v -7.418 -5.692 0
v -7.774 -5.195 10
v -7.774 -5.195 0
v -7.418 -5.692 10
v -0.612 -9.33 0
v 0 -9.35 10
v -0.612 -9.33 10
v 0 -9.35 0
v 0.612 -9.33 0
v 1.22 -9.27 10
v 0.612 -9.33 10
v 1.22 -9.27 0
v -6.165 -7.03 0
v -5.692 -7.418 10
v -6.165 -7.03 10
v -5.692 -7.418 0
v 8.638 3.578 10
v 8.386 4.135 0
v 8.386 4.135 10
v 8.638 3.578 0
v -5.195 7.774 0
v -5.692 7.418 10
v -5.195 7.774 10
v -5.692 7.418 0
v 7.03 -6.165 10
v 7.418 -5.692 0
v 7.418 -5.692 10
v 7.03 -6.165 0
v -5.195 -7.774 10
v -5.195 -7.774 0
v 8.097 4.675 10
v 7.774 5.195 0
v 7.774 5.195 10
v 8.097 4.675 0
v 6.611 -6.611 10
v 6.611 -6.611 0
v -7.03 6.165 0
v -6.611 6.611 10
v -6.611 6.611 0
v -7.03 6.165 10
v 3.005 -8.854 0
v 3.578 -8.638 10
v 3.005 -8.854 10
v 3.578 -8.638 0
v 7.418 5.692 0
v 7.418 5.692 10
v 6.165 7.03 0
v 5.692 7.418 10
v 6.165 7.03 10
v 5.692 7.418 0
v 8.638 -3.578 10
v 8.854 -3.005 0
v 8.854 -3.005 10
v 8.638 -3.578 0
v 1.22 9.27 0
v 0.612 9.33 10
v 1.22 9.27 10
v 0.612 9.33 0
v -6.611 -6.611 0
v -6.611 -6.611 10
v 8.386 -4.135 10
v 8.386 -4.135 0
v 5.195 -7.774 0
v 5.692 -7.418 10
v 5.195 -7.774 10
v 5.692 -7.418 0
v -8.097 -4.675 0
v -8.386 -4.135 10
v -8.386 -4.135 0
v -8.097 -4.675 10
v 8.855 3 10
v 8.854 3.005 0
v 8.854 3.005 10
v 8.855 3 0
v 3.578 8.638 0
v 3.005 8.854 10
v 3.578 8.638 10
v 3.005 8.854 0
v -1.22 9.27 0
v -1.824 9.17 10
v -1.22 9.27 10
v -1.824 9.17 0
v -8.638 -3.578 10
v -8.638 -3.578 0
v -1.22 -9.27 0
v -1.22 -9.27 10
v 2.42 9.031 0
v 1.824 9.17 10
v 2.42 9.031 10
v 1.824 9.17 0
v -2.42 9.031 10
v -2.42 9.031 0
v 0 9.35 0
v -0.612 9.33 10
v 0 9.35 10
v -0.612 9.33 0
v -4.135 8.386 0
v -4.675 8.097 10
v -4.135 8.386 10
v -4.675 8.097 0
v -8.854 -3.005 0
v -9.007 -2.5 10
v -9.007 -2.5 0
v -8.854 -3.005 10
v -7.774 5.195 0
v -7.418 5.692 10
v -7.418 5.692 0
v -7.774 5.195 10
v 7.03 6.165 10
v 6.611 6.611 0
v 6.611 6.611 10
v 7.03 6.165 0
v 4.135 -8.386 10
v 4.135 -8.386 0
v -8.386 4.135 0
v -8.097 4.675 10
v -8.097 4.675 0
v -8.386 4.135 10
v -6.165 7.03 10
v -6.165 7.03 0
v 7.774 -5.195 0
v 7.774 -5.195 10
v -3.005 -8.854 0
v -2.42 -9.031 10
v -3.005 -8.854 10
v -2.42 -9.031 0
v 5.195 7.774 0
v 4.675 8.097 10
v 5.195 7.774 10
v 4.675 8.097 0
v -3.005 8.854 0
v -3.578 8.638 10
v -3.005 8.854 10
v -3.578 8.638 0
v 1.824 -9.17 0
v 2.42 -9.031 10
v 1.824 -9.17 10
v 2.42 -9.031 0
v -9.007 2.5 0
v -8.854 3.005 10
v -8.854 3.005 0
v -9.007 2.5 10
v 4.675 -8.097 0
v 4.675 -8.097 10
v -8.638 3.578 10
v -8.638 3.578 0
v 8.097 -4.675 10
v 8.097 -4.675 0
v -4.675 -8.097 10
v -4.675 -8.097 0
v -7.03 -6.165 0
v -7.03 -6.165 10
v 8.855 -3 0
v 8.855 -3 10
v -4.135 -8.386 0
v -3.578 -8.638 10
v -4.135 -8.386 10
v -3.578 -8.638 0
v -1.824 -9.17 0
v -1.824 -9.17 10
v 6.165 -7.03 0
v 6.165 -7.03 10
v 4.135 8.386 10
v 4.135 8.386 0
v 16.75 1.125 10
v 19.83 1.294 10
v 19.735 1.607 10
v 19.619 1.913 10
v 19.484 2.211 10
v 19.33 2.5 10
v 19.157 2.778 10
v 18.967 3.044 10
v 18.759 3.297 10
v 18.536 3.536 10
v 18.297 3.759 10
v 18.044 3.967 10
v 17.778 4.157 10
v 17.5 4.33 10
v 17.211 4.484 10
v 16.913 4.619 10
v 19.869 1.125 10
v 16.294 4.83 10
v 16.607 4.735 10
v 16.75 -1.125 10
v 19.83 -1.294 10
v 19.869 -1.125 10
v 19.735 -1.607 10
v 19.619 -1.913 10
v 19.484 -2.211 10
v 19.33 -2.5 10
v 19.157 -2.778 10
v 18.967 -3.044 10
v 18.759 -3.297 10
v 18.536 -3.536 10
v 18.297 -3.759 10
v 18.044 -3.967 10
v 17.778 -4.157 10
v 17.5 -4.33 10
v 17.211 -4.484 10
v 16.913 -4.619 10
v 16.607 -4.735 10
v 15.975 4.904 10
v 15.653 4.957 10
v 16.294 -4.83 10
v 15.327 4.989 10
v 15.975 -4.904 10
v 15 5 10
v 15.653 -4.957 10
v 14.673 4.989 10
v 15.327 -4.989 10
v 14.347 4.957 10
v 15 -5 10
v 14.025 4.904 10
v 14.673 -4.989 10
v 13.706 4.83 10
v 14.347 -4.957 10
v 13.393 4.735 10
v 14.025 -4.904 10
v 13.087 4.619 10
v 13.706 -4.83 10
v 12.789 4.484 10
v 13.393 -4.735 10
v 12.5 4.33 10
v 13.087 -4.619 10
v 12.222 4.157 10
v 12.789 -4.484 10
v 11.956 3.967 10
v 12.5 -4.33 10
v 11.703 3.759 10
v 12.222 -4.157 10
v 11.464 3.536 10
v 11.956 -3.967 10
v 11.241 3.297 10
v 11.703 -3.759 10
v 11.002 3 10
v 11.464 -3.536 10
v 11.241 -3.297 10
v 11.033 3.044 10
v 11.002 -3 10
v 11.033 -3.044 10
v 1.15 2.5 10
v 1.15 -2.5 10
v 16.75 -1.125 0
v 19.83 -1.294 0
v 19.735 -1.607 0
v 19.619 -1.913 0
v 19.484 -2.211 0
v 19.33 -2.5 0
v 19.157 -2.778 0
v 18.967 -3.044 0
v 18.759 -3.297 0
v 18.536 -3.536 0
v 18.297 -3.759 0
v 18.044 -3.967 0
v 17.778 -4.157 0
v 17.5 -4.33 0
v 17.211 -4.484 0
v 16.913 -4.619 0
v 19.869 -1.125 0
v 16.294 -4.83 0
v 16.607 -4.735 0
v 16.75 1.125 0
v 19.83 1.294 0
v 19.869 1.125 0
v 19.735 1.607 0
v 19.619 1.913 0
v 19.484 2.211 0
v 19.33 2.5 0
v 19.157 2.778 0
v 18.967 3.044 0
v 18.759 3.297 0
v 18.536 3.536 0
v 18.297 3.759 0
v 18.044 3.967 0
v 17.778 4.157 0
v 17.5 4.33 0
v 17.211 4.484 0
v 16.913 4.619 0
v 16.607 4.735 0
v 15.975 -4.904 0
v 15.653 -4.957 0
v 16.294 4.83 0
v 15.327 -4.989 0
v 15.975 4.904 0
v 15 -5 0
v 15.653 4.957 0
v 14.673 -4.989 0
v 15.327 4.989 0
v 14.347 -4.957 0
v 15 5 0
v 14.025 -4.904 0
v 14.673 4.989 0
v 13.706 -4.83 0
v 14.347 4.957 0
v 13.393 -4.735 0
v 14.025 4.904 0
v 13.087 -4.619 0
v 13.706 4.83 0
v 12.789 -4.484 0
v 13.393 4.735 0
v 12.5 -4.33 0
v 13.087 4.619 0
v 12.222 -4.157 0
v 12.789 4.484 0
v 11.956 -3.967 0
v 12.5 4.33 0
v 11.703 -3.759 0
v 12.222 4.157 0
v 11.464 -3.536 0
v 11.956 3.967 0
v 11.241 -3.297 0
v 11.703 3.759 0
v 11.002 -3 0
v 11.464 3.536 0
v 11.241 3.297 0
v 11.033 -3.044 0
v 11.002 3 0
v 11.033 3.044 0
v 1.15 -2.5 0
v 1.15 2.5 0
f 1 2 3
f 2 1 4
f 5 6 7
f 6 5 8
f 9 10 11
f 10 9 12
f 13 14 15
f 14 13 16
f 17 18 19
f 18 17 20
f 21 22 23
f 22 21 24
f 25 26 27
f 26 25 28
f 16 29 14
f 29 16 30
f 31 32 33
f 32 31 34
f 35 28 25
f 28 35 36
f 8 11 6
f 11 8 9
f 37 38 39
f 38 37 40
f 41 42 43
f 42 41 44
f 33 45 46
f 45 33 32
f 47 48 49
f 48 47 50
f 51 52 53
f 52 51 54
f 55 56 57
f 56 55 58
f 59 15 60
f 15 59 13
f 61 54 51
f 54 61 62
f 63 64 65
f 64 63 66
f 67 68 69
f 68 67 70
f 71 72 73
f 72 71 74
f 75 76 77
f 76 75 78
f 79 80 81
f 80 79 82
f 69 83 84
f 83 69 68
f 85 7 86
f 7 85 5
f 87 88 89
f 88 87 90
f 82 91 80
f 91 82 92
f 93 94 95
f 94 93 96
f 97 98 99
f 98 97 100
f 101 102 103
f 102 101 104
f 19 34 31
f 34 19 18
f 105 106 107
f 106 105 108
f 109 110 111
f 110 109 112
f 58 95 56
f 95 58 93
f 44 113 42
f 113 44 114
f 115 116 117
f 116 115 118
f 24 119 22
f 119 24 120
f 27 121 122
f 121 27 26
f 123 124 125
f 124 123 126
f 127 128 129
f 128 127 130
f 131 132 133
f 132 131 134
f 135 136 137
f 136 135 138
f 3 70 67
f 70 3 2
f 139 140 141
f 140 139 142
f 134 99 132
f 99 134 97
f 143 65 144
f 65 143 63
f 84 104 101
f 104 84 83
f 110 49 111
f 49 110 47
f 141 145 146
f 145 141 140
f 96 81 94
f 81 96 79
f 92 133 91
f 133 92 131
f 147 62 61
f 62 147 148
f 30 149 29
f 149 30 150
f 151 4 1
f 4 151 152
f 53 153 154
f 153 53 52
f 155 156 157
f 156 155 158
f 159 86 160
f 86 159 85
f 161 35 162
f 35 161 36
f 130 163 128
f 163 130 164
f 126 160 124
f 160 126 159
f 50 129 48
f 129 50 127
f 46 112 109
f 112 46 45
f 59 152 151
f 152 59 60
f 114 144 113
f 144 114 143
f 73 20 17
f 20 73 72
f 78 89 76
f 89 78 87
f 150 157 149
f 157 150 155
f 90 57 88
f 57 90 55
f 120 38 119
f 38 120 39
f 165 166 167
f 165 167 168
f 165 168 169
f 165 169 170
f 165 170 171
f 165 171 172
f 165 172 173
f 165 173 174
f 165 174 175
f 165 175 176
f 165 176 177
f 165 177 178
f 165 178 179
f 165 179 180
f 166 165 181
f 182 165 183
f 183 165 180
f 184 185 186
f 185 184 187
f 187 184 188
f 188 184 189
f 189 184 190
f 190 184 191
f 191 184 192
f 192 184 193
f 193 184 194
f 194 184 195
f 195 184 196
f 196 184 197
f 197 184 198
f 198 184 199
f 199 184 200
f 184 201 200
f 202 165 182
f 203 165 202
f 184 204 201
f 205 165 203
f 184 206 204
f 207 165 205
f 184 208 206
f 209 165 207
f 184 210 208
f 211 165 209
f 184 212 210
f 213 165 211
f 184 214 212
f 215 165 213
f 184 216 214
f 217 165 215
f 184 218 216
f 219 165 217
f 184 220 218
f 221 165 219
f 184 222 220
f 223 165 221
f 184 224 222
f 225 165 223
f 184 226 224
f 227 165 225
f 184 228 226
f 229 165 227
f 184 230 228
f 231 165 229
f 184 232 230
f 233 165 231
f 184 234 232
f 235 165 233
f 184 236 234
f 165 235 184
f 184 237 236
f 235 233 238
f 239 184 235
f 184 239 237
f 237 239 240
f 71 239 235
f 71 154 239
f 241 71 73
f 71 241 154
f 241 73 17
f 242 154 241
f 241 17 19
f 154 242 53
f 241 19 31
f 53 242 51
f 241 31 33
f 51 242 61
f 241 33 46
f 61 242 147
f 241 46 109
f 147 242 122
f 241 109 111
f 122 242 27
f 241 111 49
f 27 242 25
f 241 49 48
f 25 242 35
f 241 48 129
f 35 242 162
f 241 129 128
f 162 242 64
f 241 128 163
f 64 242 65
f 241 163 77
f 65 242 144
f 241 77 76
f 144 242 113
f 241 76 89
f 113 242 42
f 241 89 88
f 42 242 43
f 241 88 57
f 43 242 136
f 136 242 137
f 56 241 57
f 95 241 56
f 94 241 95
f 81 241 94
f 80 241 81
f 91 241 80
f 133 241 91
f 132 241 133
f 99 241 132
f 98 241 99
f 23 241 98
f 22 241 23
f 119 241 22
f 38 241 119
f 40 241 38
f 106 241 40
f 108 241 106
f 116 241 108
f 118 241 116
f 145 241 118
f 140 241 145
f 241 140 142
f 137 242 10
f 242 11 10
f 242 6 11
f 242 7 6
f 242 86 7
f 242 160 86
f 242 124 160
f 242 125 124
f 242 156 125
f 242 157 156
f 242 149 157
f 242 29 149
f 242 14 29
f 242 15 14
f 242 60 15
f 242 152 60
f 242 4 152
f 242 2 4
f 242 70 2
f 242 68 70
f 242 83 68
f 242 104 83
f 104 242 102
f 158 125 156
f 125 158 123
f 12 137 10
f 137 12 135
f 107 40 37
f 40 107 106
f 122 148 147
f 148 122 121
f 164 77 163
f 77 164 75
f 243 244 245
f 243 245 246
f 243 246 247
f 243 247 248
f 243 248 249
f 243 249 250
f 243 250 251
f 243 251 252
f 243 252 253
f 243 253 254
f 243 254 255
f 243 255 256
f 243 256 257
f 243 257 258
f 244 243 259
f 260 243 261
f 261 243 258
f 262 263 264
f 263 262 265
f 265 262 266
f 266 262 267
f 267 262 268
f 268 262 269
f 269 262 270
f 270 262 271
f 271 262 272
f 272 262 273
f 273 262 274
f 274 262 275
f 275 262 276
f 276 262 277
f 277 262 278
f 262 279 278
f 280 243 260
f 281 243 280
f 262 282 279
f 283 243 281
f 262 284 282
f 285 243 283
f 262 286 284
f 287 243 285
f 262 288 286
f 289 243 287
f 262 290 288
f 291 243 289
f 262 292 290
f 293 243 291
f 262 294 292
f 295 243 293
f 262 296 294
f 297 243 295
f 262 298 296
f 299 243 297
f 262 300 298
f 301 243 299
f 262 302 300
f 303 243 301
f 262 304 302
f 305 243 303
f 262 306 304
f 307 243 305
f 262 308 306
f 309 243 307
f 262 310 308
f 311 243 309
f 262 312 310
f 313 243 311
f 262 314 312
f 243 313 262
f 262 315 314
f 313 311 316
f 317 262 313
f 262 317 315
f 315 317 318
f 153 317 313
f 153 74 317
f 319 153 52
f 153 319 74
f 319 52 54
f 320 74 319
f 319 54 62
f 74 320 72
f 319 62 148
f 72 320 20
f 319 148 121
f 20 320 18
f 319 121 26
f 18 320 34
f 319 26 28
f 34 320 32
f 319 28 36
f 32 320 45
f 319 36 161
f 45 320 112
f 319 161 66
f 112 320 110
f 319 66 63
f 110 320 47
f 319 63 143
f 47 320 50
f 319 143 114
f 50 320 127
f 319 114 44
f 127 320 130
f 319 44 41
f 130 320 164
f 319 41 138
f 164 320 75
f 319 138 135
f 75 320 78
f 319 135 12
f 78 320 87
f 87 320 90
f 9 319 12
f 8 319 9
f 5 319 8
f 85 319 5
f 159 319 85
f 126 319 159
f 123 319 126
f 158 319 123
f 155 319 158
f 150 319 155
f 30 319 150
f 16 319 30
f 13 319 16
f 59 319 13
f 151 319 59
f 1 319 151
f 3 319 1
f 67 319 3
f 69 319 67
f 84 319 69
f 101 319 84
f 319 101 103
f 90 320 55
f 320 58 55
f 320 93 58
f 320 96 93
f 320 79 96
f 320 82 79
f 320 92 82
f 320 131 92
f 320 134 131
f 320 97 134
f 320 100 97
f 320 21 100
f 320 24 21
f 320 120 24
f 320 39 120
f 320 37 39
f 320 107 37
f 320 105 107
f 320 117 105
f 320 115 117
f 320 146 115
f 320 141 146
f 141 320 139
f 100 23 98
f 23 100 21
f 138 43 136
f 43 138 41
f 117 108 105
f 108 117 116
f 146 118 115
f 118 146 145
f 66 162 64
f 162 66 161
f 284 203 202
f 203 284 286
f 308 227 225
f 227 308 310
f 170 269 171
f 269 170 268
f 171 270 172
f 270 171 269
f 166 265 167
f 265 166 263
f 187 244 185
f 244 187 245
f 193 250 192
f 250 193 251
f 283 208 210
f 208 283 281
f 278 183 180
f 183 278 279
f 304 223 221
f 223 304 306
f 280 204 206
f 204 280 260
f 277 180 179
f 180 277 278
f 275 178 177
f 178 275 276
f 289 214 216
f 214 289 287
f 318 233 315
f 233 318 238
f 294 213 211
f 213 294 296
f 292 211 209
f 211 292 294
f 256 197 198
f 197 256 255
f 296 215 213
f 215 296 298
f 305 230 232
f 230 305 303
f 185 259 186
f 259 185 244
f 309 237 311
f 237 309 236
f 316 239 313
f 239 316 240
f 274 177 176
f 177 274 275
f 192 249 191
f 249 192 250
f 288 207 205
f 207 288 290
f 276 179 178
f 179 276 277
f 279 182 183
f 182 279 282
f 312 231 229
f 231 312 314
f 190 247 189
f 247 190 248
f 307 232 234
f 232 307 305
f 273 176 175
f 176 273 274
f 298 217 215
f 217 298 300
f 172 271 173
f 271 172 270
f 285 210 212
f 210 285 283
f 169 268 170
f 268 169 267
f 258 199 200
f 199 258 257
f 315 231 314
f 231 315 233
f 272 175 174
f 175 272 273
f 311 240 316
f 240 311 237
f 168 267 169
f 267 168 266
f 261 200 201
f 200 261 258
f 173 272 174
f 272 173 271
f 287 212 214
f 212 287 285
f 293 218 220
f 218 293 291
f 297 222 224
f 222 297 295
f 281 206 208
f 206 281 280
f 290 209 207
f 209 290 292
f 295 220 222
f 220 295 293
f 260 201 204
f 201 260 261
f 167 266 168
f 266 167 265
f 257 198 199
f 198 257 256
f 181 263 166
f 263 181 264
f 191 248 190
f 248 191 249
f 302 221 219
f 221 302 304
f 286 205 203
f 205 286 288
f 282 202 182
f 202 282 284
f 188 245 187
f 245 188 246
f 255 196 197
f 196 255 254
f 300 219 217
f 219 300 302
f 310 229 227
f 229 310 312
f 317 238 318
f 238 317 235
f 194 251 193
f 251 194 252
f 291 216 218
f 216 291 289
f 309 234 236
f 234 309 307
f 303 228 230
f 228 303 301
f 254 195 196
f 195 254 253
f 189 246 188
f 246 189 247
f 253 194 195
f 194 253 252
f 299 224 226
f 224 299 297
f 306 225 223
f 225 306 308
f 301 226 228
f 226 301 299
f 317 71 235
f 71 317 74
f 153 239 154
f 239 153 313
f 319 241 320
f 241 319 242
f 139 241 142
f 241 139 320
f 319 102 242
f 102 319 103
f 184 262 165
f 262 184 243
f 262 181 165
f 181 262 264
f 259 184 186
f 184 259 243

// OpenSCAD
// Tubing clip for 12.7 mm (1/2 inch) lab stand rod
// Print orientation: flat on bed, extruded along Z (height = 10 mm)

// ---------------- Parameters ----------------
ring_d        = 12.7;   // rod ring inner diameter
ring_w        = 3;      // rod ring wall thickness
ring_o        = ring_d + 2 * ring_w;  // rod ring outer diameter (18.7)

opening_w     = 10;     // rod ring opening width (X cut)
opening_h     = 5;      // rod ring opening height (Y extent)

tubing_d      = 6;      // tubing ring inner diameter
tubing_w      = 2;      // tubing ring wall thickness
tubing_o      = tubing_d + 2 * tubing_w;  // tubing ring outer diameter (10)

tubing_x      = 15;     // tubing ring centre X
tubing_open_w = 4.5;    // tubing opening width (X cut)
tubing_open_h = 2.25;   // tubing opening height (Y extent)

bridge_w      = 6;      // bridge width (Y)
bridge_x1     = 8;      // bridge start X
bridge_x2     = 12;     // bridge end X

eps           = 0.5;    // cutter overshoot past faces
$fn           = 96;     // circle resolution

// ---------------- Model ----------------
difference() {
    union() {
        // Rod ring
        cylinder(d = ring_o, h = 10);
        // Tubing ring
        translate([tubing_x, 0, 0])
            cylinder(d = tubing_o, h = 10);
        // Solid bridge between the rings
        translate([bridge_x1, -bridge_w / 2, 0])
            cube([bridge_x2 - bridge_x1, bridge_w, 10]);
    }

    // Rod ring opening: x < 0, -5 < y < 5
    translate([-ring_o / 2 - eps, -opening_h / 2, -eps])
        cube([opening_w + 2 * eps, opening_h, 10 + 2 * eps]);

    // Tubing opening: x > 15, -2.25 < y < 2.25
    translate([tubing_x + tubing_open_w / 2 - eps, -tubing_open_h / 2, -eps])
        cube([tubing_open_w + 2 * eps, tubing_open_h, 10 + 2 * eps]);
}
